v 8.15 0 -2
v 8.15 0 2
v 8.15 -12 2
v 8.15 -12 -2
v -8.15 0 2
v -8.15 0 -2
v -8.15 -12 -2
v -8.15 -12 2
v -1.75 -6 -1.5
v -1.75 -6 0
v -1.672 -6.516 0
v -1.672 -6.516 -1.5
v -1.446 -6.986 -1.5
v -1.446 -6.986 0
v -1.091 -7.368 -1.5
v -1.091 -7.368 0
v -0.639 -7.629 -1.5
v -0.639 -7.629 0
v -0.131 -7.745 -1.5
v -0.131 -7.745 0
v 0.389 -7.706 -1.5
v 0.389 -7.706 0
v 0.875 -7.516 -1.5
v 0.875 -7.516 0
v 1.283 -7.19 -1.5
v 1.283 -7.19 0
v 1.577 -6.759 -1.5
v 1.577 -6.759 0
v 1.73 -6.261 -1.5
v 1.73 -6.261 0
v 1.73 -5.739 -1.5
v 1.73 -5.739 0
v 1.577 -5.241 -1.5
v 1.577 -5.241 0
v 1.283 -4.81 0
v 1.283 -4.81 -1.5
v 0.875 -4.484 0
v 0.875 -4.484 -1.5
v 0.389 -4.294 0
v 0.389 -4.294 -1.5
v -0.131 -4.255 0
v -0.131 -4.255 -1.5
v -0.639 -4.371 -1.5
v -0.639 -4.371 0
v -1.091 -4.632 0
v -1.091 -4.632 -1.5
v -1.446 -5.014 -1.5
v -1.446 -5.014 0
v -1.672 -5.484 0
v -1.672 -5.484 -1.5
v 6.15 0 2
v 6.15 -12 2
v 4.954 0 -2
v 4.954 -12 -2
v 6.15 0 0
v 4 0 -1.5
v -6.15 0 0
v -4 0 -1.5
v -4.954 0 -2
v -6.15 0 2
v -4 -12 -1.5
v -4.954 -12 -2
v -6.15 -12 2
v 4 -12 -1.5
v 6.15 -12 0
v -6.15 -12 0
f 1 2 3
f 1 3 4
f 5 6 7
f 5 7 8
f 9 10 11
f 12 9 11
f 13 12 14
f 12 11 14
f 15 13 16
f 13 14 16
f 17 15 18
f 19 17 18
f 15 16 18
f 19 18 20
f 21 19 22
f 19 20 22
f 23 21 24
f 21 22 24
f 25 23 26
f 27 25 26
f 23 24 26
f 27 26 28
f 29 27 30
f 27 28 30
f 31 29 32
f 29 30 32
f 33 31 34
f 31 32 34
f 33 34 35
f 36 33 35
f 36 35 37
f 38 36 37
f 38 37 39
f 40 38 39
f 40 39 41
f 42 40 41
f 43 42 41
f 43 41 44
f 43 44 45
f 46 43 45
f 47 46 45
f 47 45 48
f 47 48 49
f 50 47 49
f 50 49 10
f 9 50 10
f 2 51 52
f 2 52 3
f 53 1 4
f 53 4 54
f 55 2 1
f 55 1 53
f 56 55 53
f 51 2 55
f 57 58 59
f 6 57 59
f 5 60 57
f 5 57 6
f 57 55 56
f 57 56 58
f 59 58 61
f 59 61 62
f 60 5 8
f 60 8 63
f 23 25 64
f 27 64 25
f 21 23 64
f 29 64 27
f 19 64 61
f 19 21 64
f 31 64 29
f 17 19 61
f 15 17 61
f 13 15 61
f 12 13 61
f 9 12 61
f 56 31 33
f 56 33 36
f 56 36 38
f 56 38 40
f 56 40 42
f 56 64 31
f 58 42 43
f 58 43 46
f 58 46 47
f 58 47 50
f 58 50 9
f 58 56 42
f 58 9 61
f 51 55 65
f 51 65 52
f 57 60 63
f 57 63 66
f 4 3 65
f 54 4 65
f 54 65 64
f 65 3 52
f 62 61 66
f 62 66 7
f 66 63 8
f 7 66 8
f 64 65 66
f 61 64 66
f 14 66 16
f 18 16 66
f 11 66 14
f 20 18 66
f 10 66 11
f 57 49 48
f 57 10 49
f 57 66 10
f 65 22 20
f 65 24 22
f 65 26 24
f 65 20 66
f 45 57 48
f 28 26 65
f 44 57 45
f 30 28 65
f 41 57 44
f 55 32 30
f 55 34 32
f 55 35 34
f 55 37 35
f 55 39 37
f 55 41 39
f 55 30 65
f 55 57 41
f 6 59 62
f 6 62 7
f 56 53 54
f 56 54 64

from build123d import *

# Parameters (mm, degrees)
PAD_DEPTH    = 12
SKETCH001_R  = 1.75
POCKET_DEPTH = 5


with BuildPart() as part:
    # Sketch → Pad (new body)
    with BuildSketch(Plane.XZ):
        Polygon((-6.15, 0), (6.15, 0), (6.15, 2), (8.15, 2), (8.15, -2), (4.953939, -2), (4, -1.5), (-4, -1.5), (-4.953939, -2), (-8.15, -2), (-8.15, 2), (-6.15, 2), align=None)
    extrude(amount=PAD_DEPTH)

    # Sketch001 (on Face1 of Pad) → Pocket (cut)
    with BuildSketch(Plane(origin=(0, 0, 0), x_dir=(-1, 0, 0), z_dir=(0, 0, 1))):
        with Locations((0, 6)):
            Circle(SKETCH001_R)
    extrude(amount=-POCKET_DEPTH, mode=Mode.SUBTRACT)


solid = part.part
